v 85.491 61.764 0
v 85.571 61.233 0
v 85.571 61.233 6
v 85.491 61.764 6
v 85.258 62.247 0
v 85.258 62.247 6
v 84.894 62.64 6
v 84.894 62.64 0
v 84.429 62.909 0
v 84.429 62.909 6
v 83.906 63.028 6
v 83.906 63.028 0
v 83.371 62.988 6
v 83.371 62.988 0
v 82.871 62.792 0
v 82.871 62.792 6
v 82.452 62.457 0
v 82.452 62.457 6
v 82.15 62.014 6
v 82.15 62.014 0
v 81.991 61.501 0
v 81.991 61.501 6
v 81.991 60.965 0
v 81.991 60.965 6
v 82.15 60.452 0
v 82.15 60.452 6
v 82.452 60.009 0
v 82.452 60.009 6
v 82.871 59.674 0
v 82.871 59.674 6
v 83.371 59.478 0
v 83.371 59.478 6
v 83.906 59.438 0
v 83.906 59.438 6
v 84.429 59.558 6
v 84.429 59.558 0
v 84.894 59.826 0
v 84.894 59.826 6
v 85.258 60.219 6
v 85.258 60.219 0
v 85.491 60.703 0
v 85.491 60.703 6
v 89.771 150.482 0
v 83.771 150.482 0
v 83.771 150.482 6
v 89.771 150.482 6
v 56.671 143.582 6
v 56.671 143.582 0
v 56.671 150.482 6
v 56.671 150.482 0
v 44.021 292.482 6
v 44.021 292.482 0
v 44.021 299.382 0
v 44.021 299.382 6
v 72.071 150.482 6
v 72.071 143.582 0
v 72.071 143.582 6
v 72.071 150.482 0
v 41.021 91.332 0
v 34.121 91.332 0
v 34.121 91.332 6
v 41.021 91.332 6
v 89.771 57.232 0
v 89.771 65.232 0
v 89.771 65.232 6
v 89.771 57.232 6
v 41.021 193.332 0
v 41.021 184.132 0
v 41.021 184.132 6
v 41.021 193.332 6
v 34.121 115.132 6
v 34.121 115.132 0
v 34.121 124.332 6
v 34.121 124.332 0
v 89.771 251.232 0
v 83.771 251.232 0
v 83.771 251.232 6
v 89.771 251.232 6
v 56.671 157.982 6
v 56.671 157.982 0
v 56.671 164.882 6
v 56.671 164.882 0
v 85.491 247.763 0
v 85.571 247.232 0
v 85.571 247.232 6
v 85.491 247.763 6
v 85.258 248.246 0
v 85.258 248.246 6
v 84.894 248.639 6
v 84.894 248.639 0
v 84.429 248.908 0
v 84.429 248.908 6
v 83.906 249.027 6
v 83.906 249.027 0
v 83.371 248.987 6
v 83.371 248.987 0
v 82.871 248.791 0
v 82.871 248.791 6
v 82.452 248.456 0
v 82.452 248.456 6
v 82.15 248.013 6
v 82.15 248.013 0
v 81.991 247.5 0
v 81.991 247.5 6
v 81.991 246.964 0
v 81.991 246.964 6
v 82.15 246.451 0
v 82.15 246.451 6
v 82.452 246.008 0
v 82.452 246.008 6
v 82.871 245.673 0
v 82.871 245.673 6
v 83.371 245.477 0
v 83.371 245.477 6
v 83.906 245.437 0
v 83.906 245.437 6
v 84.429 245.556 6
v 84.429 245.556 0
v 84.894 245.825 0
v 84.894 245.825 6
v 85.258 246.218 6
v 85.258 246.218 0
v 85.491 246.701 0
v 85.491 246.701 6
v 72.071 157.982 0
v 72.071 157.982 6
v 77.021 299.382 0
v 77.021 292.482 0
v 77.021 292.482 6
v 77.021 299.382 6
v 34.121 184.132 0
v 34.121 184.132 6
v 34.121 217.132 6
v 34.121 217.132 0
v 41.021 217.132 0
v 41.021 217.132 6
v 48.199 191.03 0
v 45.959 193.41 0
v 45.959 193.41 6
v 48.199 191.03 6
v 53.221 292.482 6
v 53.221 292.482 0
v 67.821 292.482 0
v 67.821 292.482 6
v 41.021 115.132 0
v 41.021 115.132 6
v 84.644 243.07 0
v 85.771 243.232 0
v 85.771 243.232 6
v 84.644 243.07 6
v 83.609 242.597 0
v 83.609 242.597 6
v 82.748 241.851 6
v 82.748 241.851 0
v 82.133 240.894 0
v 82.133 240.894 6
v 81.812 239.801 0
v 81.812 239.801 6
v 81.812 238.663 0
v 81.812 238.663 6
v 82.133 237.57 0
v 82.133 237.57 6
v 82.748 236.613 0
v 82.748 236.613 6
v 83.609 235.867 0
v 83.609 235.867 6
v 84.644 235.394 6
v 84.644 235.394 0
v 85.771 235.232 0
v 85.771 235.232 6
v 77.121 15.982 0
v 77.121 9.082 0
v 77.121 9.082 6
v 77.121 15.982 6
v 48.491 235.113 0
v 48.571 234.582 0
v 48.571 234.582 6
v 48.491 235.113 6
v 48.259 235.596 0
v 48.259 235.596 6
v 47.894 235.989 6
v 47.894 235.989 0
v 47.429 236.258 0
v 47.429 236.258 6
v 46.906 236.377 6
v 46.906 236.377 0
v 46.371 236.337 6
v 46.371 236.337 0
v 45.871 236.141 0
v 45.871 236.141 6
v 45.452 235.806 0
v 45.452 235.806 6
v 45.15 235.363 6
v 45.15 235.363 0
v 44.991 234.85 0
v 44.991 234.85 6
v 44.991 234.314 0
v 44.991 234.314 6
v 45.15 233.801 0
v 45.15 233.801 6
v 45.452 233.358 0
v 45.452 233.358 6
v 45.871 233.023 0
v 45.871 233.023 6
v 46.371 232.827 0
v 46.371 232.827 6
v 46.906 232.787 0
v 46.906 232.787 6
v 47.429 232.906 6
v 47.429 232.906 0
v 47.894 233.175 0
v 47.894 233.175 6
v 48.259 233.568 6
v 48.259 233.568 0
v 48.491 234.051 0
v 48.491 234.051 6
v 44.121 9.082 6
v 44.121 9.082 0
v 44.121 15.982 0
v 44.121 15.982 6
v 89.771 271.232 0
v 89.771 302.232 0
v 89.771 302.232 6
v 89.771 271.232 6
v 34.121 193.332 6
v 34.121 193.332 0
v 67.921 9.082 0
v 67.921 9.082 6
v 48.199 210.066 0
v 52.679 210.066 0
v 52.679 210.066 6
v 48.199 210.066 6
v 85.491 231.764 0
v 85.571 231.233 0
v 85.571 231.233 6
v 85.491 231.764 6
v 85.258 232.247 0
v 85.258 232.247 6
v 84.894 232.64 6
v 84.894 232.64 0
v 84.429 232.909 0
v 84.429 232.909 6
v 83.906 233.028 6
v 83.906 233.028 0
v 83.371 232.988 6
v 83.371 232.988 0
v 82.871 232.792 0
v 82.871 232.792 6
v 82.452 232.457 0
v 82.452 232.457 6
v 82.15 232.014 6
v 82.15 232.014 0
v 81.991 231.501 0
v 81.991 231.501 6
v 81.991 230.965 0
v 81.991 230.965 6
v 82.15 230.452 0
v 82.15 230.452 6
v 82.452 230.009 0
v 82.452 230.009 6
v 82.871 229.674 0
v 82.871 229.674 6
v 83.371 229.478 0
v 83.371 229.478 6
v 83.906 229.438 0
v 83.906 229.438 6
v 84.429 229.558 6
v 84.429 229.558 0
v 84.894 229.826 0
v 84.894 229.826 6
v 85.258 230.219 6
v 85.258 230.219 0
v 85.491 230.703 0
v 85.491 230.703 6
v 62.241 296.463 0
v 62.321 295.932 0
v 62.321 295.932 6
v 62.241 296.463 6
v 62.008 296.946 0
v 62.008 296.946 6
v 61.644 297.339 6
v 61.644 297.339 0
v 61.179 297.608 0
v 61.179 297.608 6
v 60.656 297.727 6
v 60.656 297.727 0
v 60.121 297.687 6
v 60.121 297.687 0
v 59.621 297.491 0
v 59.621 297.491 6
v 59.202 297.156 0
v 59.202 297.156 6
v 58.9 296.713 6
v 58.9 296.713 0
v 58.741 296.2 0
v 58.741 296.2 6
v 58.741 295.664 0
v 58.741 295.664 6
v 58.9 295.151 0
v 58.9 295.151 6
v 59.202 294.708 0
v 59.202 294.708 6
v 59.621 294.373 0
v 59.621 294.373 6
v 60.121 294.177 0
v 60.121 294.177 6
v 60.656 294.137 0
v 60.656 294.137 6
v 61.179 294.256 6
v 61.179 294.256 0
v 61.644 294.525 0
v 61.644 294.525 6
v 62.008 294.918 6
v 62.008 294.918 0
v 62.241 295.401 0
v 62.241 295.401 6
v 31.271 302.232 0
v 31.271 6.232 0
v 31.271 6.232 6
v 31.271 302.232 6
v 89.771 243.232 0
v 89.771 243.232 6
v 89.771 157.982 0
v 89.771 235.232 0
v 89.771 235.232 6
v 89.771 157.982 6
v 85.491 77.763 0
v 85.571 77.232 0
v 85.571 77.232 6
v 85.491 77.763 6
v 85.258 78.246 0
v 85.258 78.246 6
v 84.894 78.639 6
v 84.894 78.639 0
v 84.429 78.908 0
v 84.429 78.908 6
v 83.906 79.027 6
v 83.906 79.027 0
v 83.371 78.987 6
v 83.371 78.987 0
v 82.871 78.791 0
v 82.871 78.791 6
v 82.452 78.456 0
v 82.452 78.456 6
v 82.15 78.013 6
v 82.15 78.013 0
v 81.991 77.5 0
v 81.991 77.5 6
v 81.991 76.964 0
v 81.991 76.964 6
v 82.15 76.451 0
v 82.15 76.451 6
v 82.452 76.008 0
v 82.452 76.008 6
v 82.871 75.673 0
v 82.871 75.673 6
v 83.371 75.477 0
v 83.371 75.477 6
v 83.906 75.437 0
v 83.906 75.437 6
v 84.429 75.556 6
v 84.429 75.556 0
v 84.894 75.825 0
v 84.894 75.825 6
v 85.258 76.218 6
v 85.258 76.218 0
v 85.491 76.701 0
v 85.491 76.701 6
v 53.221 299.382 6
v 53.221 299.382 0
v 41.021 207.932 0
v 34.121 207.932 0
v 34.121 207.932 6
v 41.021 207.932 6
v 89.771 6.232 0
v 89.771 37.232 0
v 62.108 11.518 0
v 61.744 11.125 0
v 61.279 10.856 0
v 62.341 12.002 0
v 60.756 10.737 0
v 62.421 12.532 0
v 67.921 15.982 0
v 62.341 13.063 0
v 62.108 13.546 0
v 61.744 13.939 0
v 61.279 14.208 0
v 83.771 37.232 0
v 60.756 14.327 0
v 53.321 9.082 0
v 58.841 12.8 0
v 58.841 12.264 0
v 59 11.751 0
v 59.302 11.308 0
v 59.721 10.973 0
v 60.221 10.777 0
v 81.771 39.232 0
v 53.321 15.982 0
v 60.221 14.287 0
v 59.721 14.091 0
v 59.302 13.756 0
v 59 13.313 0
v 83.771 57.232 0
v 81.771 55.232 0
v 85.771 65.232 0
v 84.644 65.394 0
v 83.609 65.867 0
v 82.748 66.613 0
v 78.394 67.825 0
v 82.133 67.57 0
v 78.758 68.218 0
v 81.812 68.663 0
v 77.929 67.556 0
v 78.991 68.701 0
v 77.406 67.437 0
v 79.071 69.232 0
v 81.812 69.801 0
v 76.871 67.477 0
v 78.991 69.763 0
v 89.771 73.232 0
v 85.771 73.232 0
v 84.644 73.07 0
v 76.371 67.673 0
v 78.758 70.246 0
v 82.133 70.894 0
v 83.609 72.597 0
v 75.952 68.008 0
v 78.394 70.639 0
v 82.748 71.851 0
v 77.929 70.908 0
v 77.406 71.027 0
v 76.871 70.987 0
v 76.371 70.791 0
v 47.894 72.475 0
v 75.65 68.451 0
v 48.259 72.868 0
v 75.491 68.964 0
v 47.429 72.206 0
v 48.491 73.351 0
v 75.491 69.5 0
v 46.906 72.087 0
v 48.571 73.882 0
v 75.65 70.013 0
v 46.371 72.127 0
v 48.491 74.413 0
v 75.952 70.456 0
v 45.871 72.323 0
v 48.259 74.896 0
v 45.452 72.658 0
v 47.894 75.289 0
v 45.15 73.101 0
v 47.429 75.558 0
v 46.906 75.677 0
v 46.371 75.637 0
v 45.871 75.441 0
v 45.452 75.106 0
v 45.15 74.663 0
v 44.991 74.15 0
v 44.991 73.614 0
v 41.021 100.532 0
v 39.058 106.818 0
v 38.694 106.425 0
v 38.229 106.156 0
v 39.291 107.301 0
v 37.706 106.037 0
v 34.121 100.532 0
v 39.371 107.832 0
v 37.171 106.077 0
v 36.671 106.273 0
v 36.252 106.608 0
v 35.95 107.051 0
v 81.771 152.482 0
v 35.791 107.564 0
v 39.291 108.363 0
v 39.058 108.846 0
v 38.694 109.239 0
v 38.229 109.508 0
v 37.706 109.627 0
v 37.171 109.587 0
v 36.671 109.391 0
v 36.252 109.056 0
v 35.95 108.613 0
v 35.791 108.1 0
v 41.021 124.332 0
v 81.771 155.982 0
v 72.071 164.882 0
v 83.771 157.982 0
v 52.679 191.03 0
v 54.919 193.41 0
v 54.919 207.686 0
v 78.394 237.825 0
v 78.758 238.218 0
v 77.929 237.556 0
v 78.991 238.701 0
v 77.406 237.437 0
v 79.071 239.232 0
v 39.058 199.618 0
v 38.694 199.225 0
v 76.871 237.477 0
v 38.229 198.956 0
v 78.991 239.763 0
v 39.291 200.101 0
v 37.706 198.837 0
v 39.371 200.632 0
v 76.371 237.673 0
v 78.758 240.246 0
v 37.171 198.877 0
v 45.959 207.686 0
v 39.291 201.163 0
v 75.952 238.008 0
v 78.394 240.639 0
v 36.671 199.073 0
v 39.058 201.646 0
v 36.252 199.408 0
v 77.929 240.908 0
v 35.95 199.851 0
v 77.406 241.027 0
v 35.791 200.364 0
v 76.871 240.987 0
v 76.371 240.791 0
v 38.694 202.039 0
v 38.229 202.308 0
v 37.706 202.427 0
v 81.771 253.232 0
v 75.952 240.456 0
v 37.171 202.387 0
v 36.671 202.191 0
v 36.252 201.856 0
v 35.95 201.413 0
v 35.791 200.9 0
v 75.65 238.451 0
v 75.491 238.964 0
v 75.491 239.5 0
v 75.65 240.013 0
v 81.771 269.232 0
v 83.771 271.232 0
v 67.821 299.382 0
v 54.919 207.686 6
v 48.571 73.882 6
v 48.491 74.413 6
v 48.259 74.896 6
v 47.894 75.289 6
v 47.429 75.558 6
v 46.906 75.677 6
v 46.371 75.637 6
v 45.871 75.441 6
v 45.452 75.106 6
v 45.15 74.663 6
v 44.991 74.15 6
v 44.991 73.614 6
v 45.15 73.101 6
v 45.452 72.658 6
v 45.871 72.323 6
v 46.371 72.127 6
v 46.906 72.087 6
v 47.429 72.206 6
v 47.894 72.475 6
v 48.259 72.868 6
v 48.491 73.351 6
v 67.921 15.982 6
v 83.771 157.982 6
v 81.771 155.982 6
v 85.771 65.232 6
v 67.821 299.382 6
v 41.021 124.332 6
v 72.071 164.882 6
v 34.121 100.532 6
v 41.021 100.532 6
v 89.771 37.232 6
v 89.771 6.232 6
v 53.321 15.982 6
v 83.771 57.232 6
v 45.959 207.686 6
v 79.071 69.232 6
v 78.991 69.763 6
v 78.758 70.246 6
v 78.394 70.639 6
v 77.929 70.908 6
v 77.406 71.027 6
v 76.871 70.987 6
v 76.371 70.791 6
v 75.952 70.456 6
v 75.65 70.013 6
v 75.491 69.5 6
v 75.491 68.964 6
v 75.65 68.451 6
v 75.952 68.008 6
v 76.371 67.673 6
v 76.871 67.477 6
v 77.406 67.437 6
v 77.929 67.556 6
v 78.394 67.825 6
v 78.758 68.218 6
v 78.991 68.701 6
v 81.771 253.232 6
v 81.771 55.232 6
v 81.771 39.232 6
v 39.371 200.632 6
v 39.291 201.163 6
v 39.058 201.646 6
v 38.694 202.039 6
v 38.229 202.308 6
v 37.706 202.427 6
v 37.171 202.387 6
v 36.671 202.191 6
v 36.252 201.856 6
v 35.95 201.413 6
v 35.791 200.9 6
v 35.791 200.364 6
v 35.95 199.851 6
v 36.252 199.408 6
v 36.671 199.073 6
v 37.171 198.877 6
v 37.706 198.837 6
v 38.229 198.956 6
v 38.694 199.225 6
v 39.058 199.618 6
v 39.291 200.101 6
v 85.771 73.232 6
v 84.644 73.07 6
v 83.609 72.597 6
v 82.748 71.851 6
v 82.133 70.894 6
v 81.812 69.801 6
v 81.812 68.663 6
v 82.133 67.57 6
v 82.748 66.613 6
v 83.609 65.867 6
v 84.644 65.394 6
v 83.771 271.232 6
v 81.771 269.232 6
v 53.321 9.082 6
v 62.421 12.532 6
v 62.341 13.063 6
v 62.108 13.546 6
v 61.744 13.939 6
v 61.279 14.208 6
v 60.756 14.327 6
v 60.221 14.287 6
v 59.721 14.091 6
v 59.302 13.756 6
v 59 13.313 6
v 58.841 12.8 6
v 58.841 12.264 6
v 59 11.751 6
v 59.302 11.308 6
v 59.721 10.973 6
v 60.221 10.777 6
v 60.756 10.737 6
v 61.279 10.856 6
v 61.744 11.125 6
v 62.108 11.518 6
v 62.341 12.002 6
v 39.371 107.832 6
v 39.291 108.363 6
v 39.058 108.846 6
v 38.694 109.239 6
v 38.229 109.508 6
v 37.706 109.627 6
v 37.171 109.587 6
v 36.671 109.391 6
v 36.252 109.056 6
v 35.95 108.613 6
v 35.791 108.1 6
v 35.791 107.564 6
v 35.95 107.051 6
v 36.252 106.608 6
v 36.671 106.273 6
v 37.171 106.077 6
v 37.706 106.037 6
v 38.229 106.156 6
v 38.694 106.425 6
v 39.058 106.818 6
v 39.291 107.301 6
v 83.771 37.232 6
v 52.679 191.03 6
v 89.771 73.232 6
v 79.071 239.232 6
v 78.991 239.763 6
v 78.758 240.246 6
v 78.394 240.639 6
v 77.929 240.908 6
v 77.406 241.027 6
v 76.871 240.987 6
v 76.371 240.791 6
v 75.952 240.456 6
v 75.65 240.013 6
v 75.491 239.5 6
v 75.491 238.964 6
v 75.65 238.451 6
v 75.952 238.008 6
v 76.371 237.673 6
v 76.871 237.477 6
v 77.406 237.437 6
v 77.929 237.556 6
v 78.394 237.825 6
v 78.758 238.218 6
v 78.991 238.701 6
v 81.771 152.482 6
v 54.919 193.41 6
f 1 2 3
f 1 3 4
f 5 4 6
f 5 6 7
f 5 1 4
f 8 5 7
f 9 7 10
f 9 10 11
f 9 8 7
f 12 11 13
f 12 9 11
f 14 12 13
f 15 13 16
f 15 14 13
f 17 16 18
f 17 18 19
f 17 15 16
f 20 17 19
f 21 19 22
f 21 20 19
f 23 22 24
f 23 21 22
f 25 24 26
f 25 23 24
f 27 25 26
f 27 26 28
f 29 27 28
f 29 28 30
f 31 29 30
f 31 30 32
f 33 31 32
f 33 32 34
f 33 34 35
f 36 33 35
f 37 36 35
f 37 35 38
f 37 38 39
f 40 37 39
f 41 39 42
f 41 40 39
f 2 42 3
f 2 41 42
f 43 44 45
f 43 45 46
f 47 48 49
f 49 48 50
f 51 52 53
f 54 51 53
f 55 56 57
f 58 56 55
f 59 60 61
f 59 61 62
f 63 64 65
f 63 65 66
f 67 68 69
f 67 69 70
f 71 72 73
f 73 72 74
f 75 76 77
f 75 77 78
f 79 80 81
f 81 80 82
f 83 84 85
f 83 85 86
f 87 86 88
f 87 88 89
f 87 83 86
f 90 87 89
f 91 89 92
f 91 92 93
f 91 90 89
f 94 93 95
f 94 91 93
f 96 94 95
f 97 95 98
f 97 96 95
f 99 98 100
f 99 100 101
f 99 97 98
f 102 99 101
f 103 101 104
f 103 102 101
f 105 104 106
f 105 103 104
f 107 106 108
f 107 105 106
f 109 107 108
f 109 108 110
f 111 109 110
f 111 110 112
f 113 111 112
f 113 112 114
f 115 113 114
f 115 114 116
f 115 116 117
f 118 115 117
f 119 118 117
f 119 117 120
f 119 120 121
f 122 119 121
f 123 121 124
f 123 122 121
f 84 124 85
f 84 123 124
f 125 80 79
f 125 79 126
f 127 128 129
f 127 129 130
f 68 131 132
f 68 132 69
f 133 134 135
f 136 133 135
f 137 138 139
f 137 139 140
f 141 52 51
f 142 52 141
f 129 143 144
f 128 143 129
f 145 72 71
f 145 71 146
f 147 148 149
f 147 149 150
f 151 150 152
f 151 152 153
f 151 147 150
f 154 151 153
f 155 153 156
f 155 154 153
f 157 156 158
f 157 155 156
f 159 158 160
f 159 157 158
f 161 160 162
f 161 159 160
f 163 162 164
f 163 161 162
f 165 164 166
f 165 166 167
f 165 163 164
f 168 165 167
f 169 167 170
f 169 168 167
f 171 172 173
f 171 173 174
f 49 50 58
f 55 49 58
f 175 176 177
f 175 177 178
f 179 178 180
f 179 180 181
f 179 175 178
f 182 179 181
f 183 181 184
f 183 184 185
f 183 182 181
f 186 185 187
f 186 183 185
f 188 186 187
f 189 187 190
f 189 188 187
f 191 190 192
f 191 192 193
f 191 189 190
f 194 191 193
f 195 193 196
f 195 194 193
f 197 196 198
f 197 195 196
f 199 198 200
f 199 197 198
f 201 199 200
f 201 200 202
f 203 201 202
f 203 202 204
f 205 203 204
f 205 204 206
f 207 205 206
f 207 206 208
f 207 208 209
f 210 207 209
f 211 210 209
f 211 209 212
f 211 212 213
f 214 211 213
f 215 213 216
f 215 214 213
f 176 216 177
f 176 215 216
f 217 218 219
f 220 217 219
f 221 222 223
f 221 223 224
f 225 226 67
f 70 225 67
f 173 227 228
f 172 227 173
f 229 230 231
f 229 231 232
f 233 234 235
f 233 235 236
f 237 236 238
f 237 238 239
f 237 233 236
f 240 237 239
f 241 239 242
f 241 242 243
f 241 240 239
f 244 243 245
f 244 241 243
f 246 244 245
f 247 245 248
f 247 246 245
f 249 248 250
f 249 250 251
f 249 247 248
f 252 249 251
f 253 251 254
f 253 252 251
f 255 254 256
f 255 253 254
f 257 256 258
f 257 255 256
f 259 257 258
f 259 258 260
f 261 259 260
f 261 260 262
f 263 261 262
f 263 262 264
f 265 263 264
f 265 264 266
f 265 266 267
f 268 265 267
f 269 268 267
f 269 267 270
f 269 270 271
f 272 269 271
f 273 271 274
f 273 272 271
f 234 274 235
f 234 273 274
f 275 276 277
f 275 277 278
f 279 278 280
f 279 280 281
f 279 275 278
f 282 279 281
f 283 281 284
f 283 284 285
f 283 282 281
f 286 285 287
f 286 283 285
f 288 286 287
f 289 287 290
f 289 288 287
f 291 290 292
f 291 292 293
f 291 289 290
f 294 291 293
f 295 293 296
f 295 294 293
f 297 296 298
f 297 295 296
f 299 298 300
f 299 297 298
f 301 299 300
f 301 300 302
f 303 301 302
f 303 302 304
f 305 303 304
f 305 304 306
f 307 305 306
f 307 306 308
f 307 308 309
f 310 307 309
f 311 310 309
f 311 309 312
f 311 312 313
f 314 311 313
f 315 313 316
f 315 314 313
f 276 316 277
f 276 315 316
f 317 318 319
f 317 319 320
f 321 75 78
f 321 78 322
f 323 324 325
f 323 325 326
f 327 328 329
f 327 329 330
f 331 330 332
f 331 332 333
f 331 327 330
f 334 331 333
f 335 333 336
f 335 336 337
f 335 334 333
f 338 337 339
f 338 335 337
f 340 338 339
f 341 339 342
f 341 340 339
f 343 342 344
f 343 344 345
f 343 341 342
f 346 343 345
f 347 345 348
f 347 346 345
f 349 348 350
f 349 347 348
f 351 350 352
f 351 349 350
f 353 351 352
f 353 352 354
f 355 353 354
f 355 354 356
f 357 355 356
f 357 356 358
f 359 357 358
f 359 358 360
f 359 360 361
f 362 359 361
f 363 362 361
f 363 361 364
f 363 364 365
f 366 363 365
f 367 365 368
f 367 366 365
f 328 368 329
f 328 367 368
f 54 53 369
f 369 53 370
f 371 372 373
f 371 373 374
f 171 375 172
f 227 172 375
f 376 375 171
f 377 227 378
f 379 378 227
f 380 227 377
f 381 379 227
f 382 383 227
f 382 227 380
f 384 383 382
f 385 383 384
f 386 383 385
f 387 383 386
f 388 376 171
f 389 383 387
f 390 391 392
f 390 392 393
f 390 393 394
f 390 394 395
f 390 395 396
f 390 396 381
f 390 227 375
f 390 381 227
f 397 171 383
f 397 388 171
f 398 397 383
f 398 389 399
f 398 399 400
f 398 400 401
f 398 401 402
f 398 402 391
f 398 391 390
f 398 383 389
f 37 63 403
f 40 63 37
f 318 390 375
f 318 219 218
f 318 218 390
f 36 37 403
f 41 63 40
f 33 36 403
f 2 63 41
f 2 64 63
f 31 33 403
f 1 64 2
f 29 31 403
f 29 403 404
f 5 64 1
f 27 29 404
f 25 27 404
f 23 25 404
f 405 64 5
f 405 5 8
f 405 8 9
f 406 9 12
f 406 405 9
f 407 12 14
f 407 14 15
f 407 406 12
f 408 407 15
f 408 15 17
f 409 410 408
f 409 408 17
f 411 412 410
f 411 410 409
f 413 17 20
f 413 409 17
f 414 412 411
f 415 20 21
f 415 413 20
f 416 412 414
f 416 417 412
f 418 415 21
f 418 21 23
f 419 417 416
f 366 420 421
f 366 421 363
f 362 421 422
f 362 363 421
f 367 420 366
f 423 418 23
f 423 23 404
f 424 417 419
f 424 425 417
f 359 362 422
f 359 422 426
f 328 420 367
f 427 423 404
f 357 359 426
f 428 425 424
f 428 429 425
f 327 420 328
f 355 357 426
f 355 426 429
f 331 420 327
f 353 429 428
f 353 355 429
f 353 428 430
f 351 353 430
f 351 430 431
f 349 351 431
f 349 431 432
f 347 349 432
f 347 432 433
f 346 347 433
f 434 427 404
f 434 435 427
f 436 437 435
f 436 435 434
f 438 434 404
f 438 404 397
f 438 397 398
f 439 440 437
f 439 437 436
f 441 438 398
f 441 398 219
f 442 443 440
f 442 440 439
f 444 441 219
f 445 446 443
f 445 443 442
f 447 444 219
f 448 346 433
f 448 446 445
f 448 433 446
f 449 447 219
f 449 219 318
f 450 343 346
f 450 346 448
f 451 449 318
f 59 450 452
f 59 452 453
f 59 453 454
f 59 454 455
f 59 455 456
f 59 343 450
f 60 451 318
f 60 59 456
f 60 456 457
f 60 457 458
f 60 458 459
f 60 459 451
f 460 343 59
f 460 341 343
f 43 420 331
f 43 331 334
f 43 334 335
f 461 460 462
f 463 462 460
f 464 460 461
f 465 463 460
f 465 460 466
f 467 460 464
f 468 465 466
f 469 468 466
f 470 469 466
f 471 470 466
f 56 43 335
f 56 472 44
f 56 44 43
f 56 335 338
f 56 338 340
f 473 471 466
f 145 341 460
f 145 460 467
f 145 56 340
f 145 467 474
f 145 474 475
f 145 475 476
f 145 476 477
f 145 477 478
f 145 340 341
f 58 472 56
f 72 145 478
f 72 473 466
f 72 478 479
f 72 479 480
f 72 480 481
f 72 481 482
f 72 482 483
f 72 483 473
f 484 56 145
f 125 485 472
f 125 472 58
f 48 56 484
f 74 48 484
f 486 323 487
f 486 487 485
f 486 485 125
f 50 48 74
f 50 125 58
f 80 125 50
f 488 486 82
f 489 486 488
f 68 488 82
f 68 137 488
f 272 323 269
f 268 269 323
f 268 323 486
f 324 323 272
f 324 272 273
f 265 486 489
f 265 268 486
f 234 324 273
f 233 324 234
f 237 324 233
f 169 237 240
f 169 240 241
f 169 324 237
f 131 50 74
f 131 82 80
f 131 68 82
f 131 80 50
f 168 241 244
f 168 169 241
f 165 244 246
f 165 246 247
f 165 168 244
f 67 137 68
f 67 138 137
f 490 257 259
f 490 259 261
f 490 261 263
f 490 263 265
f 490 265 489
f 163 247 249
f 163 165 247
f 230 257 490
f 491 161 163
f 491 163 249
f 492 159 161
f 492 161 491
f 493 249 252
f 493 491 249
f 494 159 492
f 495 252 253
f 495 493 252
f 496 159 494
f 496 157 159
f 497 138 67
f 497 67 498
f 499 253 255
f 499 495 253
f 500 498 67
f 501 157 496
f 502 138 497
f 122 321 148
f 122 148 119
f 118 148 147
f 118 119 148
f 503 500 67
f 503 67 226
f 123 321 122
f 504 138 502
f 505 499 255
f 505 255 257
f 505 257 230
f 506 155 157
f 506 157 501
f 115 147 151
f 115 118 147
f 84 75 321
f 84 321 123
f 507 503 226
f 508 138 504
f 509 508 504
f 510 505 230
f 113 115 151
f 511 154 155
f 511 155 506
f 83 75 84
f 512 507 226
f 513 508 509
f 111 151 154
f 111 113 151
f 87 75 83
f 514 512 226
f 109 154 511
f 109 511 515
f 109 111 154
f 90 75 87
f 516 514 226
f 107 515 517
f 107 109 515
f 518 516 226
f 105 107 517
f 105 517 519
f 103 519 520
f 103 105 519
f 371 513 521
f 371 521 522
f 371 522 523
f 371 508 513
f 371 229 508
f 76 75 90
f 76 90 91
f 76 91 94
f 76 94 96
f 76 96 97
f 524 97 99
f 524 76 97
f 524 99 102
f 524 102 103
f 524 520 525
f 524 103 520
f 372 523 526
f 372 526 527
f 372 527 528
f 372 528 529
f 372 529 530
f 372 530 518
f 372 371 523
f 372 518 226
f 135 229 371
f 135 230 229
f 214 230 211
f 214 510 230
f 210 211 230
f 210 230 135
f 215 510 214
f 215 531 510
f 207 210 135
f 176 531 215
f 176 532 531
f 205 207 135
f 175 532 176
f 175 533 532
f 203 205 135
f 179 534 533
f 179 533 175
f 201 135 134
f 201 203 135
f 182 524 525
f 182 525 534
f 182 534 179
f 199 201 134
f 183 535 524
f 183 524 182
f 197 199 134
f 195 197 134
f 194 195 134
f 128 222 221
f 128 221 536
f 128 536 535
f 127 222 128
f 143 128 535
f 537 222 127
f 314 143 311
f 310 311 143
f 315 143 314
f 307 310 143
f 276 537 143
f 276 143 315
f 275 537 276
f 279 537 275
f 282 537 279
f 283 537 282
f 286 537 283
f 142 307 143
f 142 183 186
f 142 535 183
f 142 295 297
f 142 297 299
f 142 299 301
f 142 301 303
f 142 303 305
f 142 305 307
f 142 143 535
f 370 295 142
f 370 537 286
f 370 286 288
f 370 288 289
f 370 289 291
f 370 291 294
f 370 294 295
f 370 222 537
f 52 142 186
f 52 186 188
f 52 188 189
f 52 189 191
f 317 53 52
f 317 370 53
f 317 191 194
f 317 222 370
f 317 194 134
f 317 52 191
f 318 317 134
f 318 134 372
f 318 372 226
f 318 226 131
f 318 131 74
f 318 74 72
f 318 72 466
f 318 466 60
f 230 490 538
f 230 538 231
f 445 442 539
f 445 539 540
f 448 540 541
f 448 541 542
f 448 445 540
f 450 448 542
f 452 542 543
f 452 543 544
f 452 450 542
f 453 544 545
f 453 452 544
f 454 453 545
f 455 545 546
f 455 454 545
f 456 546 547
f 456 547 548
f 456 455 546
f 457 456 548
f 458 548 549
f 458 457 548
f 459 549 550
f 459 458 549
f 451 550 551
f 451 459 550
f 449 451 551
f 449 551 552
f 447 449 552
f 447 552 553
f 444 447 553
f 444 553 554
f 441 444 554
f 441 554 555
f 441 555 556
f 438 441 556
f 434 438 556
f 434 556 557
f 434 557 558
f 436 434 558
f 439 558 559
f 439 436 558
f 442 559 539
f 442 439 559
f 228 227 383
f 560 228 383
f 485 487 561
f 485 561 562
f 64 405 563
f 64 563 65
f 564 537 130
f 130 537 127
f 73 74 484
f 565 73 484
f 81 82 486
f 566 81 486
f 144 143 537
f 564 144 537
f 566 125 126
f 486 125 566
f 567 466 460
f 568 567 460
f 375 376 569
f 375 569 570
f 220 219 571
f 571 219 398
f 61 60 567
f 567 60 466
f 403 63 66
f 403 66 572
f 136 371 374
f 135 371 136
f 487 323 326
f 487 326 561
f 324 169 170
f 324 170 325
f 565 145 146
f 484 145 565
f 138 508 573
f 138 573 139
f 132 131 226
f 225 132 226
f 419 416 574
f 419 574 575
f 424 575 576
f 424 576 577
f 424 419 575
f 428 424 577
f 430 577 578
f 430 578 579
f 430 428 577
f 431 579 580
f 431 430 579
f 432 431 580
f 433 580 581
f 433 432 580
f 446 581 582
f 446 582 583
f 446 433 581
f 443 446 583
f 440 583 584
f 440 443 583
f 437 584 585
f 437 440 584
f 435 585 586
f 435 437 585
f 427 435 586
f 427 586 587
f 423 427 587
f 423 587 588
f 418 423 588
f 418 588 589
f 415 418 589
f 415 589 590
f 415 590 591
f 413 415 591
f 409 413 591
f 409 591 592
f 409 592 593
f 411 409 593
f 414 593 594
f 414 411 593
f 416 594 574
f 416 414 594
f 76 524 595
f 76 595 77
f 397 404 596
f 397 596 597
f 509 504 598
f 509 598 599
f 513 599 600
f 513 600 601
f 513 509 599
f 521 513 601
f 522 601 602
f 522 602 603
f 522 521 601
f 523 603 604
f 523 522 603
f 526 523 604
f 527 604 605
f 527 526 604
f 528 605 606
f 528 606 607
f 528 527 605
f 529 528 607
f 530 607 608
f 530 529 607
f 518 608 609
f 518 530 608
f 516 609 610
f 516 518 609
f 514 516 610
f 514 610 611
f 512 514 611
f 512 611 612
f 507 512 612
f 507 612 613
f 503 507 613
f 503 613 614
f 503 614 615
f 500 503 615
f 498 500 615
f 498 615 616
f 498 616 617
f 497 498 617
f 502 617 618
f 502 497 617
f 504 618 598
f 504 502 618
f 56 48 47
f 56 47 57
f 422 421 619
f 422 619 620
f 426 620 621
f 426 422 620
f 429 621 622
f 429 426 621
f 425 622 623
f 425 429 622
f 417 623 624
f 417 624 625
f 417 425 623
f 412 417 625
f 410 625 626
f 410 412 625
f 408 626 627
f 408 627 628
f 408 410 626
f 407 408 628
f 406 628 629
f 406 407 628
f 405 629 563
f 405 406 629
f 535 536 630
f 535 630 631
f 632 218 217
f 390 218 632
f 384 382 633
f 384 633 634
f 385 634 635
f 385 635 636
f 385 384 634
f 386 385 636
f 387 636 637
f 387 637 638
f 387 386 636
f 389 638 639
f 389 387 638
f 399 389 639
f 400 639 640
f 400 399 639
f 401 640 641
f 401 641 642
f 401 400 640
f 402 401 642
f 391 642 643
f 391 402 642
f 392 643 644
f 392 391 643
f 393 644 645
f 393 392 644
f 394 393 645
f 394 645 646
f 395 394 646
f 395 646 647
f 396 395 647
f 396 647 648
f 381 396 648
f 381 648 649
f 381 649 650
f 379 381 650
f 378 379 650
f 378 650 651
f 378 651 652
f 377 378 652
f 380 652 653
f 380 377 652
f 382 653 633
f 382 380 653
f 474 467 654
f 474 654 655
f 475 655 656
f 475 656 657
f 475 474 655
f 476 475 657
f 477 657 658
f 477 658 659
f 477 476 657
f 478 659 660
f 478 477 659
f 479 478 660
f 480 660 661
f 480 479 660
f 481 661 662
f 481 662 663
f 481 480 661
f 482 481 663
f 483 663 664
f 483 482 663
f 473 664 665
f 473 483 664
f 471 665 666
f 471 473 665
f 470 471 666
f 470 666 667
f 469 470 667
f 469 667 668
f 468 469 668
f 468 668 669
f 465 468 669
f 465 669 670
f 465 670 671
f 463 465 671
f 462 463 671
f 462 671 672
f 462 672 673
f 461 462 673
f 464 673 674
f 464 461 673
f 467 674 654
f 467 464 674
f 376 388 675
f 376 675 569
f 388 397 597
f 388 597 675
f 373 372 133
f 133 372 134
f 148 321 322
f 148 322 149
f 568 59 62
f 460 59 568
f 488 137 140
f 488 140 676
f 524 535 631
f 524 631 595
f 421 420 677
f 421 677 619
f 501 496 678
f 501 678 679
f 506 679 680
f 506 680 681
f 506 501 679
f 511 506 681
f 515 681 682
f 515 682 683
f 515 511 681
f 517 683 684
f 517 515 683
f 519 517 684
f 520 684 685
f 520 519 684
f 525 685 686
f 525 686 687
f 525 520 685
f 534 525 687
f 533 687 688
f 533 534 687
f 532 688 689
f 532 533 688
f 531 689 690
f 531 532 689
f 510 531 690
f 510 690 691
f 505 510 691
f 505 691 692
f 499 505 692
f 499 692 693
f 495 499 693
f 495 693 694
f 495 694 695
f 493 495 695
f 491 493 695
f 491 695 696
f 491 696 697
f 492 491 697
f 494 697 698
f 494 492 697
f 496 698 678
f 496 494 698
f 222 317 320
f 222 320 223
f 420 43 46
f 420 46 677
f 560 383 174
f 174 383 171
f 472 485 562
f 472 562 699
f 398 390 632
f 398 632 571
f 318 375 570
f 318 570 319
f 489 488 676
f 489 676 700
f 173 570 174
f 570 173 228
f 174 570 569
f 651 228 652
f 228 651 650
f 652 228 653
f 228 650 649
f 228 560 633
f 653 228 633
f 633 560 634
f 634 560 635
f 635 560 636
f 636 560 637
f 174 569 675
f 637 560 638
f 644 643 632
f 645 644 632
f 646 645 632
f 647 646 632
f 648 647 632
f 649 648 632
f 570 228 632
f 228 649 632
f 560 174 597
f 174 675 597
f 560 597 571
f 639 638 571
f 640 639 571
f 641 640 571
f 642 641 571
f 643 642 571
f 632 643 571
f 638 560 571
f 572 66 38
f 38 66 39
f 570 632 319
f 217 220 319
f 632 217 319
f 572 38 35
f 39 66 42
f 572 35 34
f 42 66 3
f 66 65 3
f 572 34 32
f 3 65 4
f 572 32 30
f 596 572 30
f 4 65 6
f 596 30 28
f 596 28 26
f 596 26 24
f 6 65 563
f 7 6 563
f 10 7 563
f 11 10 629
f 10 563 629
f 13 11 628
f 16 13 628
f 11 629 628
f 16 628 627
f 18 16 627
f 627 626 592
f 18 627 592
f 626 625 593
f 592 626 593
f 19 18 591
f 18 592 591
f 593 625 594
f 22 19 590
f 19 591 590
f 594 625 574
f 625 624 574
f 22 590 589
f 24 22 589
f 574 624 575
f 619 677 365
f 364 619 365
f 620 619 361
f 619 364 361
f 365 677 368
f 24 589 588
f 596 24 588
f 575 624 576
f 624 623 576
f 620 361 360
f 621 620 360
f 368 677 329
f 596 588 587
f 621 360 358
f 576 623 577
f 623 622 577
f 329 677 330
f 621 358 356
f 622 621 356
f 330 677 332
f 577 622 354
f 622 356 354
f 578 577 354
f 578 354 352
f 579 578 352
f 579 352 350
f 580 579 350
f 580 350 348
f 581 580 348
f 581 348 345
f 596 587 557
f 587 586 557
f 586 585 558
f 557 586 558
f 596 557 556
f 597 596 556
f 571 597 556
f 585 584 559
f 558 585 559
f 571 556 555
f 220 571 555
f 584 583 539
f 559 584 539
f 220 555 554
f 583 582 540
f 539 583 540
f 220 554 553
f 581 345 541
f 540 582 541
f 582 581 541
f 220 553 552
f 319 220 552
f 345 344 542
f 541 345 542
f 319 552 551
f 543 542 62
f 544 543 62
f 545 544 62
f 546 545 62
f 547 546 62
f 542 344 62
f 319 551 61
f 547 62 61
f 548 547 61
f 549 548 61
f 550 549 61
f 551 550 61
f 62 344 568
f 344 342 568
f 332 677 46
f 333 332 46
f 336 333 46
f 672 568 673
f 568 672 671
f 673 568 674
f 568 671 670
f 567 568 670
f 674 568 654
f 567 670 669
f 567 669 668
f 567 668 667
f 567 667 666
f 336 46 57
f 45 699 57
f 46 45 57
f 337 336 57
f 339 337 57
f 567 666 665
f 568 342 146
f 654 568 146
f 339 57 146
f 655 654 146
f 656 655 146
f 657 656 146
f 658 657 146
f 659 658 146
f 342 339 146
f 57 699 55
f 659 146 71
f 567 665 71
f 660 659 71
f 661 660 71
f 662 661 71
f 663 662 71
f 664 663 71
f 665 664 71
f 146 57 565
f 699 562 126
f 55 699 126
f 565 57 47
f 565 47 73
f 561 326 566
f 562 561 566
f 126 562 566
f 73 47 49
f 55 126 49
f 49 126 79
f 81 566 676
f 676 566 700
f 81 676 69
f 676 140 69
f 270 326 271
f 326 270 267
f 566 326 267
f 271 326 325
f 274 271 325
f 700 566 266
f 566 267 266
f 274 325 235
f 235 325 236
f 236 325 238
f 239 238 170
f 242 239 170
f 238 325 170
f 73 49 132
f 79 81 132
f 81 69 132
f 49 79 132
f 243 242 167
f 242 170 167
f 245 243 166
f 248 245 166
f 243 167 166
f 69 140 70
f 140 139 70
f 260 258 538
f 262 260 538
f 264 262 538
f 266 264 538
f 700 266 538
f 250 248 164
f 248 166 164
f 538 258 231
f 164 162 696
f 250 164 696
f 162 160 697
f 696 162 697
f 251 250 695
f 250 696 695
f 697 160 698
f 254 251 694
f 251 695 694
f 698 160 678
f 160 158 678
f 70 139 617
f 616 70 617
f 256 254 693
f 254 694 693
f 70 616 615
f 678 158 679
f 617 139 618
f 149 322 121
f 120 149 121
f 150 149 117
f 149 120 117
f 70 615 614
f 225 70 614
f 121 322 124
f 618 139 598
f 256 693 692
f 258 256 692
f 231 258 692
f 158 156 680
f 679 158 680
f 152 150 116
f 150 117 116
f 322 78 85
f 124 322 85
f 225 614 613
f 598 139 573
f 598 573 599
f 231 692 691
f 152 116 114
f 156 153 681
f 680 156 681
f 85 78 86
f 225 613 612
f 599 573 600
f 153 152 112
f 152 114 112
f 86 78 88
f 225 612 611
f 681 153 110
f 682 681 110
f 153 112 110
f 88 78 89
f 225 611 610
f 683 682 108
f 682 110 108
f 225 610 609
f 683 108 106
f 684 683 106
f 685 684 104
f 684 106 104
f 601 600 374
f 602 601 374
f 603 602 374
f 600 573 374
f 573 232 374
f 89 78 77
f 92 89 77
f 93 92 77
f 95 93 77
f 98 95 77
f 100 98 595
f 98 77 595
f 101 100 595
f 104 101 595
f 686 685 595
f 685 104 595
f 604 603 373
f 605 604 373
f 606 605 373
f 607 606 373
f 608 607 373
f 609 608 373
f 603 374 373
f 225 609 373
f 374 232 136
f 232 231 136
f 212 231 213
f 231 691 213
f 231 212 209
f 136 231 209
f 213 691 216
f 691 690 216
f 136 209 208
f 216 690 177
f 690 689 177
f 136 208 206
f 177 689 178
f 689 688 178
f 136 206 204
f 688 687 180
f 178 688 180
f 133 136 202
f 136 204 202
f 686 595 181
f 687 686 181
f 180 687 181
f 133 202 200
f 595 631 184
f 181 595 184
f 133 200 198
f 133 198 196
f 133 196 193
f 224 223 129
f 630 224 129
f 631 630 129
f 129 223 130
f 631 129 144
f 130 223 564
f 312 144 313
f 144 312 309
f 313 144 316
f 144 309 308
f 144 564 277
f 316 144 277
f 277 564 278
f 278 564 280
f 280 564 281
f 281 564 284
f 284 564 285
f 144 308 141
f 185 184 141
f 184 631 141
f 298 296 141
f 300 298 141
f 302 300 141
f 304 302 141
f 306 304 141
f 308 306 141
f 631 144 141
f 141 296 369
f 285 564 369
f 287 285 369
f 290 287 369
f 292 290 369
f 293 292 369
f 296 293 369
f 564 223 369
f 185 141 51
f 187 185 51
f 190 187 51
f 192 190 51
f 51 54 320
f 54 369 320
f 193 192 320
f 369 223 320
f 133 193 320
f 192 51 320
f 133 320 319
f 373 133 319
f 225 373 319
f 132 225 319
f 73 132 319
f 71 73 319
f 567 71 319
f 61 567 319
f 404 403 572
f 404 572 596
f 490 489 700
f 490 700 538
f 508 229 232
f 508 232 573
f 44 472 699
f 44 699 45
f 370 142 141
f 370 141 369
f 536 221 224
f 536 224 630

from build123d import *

# Parameters (mm, degrees)
MODEL_R                  = 1.8
MODEL_W                  = 9.199995837
MODEL_H                  = 6.900001917
MODEL_W_2                = 9.1999977
MODEL_W_3                = 15.39999384
MODEL_H_2                = 6.899997952
MODEL_W_4                = 6.900001918
MODEL_H_3                = 9.199995837
MODEL_H_4                = 9.1999977
MODEL_H_5                = 9.199997699
RESSALTO_EXTRUS_O1_DEPTH = 6


with BuildPart() as part:
    # Model → Ressalto-extrusão1 (new body)
    with BuildSketch(Plane.XY):
        with BuildLine():
            Line((89.771252514, 6.232071499), (31.271271234, 6.232071499))
            Line((31.271271234, 6.232071499), (31.271271234, 302.231976779))
            Line((31.271271234, 302.231976779), (89.771252514, 302.231976779))
            Line((89.771252514, 302.231976779), (89.771252514, 271.231986699))
            Line((89.771252514, 271.231986699), (83.771254434, 271.231986699))
            Line((83.771254434, 271.231986699), (81.771255074, 269.231987339))
            Line((81.771255074, 269.231987339), (81.771255074, 253.231992459))
            Line((81.771255074, 253.231992459), (83.771254434, 251.231993099))
            Line((83.771254434, 251.231993099), (89.771252514, 251.231993099))
            Line((89.771252514, 251.231993099), (89.771252514, 243.231995659))
            Line((89.771252514, 243.231995659), (85.771253794, 243.231995659))
            ThreePointArc((85.771253794, 243.231995659), (81.771255074, 239.231996939), (85.771253794, 235.231998219))
            Line((85.771253794, 235.231998219), (89.771252514, 235.231998219))
            Line((89.771252514, 235.231998219), (89.771252514, 157.982022859))
            Line((89.771252514, 157.982022859), (83.771254434, 157.982022859))
            Line((83.771254434, 157.982022859), (81.771255074, 155.982023499))
            Line((81.771255074, 155.982023499), (81.771255074, 152.482024779))
            Line((81.771255074, 152.482024779), (83.771254434, 150.482025419))
            Line((83.771254434, 150.482025419), (89.771252514, 150.482025419))
            Line((89.771252514, 150.482025419), (89.771252514, 73.232050059))
            Line((89.771252514, 73.232050059), (85.771253794, 73.232050059))
            ThreePointArc((85.771253794, 73.232050059), (81.771255074, 69.232051339), (85.771253794, 65.232052619))
            Line((85.771253794, 65.232052619), (89.771252514, 65.232052619))
            Line((89.771252514, 65.232052619), (89.771252514, 57.232055179))
            Line((89.771252514, 57.232055179), (83.771254434, 57.232055179))
            Line((83.771254434, 57.232055179), (81.771255074, 55.232055819))
            Line((81.771255074, 55.232055819), (81.771255074, 39.232060939))
            Line((81.771255074, 39.232060939), (83.771254434, 37.232061579))
            Line((83.771254434, 37.232061579), (89.771252514, 37.232061579))
            Line((89.771252514, 37.232061579), (89.771252514, 6.232071499))
        make_face()
        with Locations((60.621261842, 12.532070537)):
            Circle(MODEL_R, mode=Mode.SUBTRACT)
        with Locations((83.771254434, 61.233170309)):
            Circle(MODEL_R, mode=Mode.SUBTRACT)
        with Locations((77.271256514, 69.232051339)):
            Circle(MODEL_R, mode=Mode.SUBTRACT)
        with Locations((83.771254434, 77.232048779)):
            Circle(MODEL_R, mode=Mode.SUBTRACT)
        with Locations((46.771271234, 73.882024139)):
            Circle(MODEL_R, mode=Mode.SUBTRACT)
        with Locations((37.571269218, 107.832043016)):
            Circle(MODEL_R, mode=Mode.SUBTRACT)
        with Locations((37.571269218, 200.632005262)):
            Circle(MODEL_R, mode=Mode.SUBTRACT)
        with Locations((46.771271234, 234.582024139)):
            Circle(MODEL_R, mode=Mode.SUBTRACT)
        with Locations((83.771254434, 231.233115909)):
            Circle(MODEL_R, mode=Mode.SUBTRACT)
        with Locations((77.271256514, 239.231996939)):
            Circle(MODEL_R, mode=Mode.SUBTRACT)
        with Locations((83.771254434, 247.231994379)):
            Circle(MODEL_R, mode=Mode.SUBTRACT)
        with Locations((60.521261874, 295.931975819)):
            Circle(MODEL_R, mode=Mode.SUBTRACT)
        with Locations((72.521257893, 12.532071498)):
            Rectangle(MODEL_W, MODEL_H, mode=Mode.SUBTRACT)
        with Locations((48.621267095, 295.931976781)):
            Rectangle(MODEL_W_2, MODEL_H, mode=Mode.SUBTRACT)
        with Locations((64.371263002, 147.032026443)):
            Rectangle(MODEL_W_3, MODEL_H_2, mode=Mode.SUBTRACT)
        with Locations((37.571270179, 95.932046966)):
            Rectangle(MODEL_W_4, MODEL_H_3, mode=Mode.SUBTRACT)
        with Locations((72.421257924, 295.931976781)):
            Rectangle(MODEL_W, MODEL_H, mode=Mode.SUBTRACT)
        with Locations((37.571270179, 212.532000041)):
            Rectangle(MODEL_W_4, MODEL_H_4, mode=Mode.SUBTRACT)
        with Locations((37.571270179, 119.732037796)):
            Rectangle(MODEL_W_4, MODEL_H_5, mode=Mode.SUBTRACT)
        with Locations((48.721267063, 12.532071498)):
            Rectangle(MODEL_W_2, MODEL_H, mode=Mode.SUBTRACT)
        with Locations((37.571270179, 188.732009212)):
            Rectangle(MODEL_W_4, MODEL_H_3, mode=Mode.SUBTRACT)
        with Locations((64.371263002, 161.432021835)):
            Rectangle(MODEL_W_3, MODEL_H_2, mode=Mode.SUBTRACT)
        Polygon((54.919245732, 207.685602791), (52.679245732, 210.065602791), (48.199248599, 210.065602791), (45.959248599, 207.685602791), (45.959248599, 193.410404919), (48.199248599, 191.030404919), (52.679245732, 191.030404919), (54.919245732, 193.410404919), align=None, mode=Mode.SUBTRACT)
    extrude(amount=RESSALTO_EXTRUS_O1_DEPTH)


solid = part.part
